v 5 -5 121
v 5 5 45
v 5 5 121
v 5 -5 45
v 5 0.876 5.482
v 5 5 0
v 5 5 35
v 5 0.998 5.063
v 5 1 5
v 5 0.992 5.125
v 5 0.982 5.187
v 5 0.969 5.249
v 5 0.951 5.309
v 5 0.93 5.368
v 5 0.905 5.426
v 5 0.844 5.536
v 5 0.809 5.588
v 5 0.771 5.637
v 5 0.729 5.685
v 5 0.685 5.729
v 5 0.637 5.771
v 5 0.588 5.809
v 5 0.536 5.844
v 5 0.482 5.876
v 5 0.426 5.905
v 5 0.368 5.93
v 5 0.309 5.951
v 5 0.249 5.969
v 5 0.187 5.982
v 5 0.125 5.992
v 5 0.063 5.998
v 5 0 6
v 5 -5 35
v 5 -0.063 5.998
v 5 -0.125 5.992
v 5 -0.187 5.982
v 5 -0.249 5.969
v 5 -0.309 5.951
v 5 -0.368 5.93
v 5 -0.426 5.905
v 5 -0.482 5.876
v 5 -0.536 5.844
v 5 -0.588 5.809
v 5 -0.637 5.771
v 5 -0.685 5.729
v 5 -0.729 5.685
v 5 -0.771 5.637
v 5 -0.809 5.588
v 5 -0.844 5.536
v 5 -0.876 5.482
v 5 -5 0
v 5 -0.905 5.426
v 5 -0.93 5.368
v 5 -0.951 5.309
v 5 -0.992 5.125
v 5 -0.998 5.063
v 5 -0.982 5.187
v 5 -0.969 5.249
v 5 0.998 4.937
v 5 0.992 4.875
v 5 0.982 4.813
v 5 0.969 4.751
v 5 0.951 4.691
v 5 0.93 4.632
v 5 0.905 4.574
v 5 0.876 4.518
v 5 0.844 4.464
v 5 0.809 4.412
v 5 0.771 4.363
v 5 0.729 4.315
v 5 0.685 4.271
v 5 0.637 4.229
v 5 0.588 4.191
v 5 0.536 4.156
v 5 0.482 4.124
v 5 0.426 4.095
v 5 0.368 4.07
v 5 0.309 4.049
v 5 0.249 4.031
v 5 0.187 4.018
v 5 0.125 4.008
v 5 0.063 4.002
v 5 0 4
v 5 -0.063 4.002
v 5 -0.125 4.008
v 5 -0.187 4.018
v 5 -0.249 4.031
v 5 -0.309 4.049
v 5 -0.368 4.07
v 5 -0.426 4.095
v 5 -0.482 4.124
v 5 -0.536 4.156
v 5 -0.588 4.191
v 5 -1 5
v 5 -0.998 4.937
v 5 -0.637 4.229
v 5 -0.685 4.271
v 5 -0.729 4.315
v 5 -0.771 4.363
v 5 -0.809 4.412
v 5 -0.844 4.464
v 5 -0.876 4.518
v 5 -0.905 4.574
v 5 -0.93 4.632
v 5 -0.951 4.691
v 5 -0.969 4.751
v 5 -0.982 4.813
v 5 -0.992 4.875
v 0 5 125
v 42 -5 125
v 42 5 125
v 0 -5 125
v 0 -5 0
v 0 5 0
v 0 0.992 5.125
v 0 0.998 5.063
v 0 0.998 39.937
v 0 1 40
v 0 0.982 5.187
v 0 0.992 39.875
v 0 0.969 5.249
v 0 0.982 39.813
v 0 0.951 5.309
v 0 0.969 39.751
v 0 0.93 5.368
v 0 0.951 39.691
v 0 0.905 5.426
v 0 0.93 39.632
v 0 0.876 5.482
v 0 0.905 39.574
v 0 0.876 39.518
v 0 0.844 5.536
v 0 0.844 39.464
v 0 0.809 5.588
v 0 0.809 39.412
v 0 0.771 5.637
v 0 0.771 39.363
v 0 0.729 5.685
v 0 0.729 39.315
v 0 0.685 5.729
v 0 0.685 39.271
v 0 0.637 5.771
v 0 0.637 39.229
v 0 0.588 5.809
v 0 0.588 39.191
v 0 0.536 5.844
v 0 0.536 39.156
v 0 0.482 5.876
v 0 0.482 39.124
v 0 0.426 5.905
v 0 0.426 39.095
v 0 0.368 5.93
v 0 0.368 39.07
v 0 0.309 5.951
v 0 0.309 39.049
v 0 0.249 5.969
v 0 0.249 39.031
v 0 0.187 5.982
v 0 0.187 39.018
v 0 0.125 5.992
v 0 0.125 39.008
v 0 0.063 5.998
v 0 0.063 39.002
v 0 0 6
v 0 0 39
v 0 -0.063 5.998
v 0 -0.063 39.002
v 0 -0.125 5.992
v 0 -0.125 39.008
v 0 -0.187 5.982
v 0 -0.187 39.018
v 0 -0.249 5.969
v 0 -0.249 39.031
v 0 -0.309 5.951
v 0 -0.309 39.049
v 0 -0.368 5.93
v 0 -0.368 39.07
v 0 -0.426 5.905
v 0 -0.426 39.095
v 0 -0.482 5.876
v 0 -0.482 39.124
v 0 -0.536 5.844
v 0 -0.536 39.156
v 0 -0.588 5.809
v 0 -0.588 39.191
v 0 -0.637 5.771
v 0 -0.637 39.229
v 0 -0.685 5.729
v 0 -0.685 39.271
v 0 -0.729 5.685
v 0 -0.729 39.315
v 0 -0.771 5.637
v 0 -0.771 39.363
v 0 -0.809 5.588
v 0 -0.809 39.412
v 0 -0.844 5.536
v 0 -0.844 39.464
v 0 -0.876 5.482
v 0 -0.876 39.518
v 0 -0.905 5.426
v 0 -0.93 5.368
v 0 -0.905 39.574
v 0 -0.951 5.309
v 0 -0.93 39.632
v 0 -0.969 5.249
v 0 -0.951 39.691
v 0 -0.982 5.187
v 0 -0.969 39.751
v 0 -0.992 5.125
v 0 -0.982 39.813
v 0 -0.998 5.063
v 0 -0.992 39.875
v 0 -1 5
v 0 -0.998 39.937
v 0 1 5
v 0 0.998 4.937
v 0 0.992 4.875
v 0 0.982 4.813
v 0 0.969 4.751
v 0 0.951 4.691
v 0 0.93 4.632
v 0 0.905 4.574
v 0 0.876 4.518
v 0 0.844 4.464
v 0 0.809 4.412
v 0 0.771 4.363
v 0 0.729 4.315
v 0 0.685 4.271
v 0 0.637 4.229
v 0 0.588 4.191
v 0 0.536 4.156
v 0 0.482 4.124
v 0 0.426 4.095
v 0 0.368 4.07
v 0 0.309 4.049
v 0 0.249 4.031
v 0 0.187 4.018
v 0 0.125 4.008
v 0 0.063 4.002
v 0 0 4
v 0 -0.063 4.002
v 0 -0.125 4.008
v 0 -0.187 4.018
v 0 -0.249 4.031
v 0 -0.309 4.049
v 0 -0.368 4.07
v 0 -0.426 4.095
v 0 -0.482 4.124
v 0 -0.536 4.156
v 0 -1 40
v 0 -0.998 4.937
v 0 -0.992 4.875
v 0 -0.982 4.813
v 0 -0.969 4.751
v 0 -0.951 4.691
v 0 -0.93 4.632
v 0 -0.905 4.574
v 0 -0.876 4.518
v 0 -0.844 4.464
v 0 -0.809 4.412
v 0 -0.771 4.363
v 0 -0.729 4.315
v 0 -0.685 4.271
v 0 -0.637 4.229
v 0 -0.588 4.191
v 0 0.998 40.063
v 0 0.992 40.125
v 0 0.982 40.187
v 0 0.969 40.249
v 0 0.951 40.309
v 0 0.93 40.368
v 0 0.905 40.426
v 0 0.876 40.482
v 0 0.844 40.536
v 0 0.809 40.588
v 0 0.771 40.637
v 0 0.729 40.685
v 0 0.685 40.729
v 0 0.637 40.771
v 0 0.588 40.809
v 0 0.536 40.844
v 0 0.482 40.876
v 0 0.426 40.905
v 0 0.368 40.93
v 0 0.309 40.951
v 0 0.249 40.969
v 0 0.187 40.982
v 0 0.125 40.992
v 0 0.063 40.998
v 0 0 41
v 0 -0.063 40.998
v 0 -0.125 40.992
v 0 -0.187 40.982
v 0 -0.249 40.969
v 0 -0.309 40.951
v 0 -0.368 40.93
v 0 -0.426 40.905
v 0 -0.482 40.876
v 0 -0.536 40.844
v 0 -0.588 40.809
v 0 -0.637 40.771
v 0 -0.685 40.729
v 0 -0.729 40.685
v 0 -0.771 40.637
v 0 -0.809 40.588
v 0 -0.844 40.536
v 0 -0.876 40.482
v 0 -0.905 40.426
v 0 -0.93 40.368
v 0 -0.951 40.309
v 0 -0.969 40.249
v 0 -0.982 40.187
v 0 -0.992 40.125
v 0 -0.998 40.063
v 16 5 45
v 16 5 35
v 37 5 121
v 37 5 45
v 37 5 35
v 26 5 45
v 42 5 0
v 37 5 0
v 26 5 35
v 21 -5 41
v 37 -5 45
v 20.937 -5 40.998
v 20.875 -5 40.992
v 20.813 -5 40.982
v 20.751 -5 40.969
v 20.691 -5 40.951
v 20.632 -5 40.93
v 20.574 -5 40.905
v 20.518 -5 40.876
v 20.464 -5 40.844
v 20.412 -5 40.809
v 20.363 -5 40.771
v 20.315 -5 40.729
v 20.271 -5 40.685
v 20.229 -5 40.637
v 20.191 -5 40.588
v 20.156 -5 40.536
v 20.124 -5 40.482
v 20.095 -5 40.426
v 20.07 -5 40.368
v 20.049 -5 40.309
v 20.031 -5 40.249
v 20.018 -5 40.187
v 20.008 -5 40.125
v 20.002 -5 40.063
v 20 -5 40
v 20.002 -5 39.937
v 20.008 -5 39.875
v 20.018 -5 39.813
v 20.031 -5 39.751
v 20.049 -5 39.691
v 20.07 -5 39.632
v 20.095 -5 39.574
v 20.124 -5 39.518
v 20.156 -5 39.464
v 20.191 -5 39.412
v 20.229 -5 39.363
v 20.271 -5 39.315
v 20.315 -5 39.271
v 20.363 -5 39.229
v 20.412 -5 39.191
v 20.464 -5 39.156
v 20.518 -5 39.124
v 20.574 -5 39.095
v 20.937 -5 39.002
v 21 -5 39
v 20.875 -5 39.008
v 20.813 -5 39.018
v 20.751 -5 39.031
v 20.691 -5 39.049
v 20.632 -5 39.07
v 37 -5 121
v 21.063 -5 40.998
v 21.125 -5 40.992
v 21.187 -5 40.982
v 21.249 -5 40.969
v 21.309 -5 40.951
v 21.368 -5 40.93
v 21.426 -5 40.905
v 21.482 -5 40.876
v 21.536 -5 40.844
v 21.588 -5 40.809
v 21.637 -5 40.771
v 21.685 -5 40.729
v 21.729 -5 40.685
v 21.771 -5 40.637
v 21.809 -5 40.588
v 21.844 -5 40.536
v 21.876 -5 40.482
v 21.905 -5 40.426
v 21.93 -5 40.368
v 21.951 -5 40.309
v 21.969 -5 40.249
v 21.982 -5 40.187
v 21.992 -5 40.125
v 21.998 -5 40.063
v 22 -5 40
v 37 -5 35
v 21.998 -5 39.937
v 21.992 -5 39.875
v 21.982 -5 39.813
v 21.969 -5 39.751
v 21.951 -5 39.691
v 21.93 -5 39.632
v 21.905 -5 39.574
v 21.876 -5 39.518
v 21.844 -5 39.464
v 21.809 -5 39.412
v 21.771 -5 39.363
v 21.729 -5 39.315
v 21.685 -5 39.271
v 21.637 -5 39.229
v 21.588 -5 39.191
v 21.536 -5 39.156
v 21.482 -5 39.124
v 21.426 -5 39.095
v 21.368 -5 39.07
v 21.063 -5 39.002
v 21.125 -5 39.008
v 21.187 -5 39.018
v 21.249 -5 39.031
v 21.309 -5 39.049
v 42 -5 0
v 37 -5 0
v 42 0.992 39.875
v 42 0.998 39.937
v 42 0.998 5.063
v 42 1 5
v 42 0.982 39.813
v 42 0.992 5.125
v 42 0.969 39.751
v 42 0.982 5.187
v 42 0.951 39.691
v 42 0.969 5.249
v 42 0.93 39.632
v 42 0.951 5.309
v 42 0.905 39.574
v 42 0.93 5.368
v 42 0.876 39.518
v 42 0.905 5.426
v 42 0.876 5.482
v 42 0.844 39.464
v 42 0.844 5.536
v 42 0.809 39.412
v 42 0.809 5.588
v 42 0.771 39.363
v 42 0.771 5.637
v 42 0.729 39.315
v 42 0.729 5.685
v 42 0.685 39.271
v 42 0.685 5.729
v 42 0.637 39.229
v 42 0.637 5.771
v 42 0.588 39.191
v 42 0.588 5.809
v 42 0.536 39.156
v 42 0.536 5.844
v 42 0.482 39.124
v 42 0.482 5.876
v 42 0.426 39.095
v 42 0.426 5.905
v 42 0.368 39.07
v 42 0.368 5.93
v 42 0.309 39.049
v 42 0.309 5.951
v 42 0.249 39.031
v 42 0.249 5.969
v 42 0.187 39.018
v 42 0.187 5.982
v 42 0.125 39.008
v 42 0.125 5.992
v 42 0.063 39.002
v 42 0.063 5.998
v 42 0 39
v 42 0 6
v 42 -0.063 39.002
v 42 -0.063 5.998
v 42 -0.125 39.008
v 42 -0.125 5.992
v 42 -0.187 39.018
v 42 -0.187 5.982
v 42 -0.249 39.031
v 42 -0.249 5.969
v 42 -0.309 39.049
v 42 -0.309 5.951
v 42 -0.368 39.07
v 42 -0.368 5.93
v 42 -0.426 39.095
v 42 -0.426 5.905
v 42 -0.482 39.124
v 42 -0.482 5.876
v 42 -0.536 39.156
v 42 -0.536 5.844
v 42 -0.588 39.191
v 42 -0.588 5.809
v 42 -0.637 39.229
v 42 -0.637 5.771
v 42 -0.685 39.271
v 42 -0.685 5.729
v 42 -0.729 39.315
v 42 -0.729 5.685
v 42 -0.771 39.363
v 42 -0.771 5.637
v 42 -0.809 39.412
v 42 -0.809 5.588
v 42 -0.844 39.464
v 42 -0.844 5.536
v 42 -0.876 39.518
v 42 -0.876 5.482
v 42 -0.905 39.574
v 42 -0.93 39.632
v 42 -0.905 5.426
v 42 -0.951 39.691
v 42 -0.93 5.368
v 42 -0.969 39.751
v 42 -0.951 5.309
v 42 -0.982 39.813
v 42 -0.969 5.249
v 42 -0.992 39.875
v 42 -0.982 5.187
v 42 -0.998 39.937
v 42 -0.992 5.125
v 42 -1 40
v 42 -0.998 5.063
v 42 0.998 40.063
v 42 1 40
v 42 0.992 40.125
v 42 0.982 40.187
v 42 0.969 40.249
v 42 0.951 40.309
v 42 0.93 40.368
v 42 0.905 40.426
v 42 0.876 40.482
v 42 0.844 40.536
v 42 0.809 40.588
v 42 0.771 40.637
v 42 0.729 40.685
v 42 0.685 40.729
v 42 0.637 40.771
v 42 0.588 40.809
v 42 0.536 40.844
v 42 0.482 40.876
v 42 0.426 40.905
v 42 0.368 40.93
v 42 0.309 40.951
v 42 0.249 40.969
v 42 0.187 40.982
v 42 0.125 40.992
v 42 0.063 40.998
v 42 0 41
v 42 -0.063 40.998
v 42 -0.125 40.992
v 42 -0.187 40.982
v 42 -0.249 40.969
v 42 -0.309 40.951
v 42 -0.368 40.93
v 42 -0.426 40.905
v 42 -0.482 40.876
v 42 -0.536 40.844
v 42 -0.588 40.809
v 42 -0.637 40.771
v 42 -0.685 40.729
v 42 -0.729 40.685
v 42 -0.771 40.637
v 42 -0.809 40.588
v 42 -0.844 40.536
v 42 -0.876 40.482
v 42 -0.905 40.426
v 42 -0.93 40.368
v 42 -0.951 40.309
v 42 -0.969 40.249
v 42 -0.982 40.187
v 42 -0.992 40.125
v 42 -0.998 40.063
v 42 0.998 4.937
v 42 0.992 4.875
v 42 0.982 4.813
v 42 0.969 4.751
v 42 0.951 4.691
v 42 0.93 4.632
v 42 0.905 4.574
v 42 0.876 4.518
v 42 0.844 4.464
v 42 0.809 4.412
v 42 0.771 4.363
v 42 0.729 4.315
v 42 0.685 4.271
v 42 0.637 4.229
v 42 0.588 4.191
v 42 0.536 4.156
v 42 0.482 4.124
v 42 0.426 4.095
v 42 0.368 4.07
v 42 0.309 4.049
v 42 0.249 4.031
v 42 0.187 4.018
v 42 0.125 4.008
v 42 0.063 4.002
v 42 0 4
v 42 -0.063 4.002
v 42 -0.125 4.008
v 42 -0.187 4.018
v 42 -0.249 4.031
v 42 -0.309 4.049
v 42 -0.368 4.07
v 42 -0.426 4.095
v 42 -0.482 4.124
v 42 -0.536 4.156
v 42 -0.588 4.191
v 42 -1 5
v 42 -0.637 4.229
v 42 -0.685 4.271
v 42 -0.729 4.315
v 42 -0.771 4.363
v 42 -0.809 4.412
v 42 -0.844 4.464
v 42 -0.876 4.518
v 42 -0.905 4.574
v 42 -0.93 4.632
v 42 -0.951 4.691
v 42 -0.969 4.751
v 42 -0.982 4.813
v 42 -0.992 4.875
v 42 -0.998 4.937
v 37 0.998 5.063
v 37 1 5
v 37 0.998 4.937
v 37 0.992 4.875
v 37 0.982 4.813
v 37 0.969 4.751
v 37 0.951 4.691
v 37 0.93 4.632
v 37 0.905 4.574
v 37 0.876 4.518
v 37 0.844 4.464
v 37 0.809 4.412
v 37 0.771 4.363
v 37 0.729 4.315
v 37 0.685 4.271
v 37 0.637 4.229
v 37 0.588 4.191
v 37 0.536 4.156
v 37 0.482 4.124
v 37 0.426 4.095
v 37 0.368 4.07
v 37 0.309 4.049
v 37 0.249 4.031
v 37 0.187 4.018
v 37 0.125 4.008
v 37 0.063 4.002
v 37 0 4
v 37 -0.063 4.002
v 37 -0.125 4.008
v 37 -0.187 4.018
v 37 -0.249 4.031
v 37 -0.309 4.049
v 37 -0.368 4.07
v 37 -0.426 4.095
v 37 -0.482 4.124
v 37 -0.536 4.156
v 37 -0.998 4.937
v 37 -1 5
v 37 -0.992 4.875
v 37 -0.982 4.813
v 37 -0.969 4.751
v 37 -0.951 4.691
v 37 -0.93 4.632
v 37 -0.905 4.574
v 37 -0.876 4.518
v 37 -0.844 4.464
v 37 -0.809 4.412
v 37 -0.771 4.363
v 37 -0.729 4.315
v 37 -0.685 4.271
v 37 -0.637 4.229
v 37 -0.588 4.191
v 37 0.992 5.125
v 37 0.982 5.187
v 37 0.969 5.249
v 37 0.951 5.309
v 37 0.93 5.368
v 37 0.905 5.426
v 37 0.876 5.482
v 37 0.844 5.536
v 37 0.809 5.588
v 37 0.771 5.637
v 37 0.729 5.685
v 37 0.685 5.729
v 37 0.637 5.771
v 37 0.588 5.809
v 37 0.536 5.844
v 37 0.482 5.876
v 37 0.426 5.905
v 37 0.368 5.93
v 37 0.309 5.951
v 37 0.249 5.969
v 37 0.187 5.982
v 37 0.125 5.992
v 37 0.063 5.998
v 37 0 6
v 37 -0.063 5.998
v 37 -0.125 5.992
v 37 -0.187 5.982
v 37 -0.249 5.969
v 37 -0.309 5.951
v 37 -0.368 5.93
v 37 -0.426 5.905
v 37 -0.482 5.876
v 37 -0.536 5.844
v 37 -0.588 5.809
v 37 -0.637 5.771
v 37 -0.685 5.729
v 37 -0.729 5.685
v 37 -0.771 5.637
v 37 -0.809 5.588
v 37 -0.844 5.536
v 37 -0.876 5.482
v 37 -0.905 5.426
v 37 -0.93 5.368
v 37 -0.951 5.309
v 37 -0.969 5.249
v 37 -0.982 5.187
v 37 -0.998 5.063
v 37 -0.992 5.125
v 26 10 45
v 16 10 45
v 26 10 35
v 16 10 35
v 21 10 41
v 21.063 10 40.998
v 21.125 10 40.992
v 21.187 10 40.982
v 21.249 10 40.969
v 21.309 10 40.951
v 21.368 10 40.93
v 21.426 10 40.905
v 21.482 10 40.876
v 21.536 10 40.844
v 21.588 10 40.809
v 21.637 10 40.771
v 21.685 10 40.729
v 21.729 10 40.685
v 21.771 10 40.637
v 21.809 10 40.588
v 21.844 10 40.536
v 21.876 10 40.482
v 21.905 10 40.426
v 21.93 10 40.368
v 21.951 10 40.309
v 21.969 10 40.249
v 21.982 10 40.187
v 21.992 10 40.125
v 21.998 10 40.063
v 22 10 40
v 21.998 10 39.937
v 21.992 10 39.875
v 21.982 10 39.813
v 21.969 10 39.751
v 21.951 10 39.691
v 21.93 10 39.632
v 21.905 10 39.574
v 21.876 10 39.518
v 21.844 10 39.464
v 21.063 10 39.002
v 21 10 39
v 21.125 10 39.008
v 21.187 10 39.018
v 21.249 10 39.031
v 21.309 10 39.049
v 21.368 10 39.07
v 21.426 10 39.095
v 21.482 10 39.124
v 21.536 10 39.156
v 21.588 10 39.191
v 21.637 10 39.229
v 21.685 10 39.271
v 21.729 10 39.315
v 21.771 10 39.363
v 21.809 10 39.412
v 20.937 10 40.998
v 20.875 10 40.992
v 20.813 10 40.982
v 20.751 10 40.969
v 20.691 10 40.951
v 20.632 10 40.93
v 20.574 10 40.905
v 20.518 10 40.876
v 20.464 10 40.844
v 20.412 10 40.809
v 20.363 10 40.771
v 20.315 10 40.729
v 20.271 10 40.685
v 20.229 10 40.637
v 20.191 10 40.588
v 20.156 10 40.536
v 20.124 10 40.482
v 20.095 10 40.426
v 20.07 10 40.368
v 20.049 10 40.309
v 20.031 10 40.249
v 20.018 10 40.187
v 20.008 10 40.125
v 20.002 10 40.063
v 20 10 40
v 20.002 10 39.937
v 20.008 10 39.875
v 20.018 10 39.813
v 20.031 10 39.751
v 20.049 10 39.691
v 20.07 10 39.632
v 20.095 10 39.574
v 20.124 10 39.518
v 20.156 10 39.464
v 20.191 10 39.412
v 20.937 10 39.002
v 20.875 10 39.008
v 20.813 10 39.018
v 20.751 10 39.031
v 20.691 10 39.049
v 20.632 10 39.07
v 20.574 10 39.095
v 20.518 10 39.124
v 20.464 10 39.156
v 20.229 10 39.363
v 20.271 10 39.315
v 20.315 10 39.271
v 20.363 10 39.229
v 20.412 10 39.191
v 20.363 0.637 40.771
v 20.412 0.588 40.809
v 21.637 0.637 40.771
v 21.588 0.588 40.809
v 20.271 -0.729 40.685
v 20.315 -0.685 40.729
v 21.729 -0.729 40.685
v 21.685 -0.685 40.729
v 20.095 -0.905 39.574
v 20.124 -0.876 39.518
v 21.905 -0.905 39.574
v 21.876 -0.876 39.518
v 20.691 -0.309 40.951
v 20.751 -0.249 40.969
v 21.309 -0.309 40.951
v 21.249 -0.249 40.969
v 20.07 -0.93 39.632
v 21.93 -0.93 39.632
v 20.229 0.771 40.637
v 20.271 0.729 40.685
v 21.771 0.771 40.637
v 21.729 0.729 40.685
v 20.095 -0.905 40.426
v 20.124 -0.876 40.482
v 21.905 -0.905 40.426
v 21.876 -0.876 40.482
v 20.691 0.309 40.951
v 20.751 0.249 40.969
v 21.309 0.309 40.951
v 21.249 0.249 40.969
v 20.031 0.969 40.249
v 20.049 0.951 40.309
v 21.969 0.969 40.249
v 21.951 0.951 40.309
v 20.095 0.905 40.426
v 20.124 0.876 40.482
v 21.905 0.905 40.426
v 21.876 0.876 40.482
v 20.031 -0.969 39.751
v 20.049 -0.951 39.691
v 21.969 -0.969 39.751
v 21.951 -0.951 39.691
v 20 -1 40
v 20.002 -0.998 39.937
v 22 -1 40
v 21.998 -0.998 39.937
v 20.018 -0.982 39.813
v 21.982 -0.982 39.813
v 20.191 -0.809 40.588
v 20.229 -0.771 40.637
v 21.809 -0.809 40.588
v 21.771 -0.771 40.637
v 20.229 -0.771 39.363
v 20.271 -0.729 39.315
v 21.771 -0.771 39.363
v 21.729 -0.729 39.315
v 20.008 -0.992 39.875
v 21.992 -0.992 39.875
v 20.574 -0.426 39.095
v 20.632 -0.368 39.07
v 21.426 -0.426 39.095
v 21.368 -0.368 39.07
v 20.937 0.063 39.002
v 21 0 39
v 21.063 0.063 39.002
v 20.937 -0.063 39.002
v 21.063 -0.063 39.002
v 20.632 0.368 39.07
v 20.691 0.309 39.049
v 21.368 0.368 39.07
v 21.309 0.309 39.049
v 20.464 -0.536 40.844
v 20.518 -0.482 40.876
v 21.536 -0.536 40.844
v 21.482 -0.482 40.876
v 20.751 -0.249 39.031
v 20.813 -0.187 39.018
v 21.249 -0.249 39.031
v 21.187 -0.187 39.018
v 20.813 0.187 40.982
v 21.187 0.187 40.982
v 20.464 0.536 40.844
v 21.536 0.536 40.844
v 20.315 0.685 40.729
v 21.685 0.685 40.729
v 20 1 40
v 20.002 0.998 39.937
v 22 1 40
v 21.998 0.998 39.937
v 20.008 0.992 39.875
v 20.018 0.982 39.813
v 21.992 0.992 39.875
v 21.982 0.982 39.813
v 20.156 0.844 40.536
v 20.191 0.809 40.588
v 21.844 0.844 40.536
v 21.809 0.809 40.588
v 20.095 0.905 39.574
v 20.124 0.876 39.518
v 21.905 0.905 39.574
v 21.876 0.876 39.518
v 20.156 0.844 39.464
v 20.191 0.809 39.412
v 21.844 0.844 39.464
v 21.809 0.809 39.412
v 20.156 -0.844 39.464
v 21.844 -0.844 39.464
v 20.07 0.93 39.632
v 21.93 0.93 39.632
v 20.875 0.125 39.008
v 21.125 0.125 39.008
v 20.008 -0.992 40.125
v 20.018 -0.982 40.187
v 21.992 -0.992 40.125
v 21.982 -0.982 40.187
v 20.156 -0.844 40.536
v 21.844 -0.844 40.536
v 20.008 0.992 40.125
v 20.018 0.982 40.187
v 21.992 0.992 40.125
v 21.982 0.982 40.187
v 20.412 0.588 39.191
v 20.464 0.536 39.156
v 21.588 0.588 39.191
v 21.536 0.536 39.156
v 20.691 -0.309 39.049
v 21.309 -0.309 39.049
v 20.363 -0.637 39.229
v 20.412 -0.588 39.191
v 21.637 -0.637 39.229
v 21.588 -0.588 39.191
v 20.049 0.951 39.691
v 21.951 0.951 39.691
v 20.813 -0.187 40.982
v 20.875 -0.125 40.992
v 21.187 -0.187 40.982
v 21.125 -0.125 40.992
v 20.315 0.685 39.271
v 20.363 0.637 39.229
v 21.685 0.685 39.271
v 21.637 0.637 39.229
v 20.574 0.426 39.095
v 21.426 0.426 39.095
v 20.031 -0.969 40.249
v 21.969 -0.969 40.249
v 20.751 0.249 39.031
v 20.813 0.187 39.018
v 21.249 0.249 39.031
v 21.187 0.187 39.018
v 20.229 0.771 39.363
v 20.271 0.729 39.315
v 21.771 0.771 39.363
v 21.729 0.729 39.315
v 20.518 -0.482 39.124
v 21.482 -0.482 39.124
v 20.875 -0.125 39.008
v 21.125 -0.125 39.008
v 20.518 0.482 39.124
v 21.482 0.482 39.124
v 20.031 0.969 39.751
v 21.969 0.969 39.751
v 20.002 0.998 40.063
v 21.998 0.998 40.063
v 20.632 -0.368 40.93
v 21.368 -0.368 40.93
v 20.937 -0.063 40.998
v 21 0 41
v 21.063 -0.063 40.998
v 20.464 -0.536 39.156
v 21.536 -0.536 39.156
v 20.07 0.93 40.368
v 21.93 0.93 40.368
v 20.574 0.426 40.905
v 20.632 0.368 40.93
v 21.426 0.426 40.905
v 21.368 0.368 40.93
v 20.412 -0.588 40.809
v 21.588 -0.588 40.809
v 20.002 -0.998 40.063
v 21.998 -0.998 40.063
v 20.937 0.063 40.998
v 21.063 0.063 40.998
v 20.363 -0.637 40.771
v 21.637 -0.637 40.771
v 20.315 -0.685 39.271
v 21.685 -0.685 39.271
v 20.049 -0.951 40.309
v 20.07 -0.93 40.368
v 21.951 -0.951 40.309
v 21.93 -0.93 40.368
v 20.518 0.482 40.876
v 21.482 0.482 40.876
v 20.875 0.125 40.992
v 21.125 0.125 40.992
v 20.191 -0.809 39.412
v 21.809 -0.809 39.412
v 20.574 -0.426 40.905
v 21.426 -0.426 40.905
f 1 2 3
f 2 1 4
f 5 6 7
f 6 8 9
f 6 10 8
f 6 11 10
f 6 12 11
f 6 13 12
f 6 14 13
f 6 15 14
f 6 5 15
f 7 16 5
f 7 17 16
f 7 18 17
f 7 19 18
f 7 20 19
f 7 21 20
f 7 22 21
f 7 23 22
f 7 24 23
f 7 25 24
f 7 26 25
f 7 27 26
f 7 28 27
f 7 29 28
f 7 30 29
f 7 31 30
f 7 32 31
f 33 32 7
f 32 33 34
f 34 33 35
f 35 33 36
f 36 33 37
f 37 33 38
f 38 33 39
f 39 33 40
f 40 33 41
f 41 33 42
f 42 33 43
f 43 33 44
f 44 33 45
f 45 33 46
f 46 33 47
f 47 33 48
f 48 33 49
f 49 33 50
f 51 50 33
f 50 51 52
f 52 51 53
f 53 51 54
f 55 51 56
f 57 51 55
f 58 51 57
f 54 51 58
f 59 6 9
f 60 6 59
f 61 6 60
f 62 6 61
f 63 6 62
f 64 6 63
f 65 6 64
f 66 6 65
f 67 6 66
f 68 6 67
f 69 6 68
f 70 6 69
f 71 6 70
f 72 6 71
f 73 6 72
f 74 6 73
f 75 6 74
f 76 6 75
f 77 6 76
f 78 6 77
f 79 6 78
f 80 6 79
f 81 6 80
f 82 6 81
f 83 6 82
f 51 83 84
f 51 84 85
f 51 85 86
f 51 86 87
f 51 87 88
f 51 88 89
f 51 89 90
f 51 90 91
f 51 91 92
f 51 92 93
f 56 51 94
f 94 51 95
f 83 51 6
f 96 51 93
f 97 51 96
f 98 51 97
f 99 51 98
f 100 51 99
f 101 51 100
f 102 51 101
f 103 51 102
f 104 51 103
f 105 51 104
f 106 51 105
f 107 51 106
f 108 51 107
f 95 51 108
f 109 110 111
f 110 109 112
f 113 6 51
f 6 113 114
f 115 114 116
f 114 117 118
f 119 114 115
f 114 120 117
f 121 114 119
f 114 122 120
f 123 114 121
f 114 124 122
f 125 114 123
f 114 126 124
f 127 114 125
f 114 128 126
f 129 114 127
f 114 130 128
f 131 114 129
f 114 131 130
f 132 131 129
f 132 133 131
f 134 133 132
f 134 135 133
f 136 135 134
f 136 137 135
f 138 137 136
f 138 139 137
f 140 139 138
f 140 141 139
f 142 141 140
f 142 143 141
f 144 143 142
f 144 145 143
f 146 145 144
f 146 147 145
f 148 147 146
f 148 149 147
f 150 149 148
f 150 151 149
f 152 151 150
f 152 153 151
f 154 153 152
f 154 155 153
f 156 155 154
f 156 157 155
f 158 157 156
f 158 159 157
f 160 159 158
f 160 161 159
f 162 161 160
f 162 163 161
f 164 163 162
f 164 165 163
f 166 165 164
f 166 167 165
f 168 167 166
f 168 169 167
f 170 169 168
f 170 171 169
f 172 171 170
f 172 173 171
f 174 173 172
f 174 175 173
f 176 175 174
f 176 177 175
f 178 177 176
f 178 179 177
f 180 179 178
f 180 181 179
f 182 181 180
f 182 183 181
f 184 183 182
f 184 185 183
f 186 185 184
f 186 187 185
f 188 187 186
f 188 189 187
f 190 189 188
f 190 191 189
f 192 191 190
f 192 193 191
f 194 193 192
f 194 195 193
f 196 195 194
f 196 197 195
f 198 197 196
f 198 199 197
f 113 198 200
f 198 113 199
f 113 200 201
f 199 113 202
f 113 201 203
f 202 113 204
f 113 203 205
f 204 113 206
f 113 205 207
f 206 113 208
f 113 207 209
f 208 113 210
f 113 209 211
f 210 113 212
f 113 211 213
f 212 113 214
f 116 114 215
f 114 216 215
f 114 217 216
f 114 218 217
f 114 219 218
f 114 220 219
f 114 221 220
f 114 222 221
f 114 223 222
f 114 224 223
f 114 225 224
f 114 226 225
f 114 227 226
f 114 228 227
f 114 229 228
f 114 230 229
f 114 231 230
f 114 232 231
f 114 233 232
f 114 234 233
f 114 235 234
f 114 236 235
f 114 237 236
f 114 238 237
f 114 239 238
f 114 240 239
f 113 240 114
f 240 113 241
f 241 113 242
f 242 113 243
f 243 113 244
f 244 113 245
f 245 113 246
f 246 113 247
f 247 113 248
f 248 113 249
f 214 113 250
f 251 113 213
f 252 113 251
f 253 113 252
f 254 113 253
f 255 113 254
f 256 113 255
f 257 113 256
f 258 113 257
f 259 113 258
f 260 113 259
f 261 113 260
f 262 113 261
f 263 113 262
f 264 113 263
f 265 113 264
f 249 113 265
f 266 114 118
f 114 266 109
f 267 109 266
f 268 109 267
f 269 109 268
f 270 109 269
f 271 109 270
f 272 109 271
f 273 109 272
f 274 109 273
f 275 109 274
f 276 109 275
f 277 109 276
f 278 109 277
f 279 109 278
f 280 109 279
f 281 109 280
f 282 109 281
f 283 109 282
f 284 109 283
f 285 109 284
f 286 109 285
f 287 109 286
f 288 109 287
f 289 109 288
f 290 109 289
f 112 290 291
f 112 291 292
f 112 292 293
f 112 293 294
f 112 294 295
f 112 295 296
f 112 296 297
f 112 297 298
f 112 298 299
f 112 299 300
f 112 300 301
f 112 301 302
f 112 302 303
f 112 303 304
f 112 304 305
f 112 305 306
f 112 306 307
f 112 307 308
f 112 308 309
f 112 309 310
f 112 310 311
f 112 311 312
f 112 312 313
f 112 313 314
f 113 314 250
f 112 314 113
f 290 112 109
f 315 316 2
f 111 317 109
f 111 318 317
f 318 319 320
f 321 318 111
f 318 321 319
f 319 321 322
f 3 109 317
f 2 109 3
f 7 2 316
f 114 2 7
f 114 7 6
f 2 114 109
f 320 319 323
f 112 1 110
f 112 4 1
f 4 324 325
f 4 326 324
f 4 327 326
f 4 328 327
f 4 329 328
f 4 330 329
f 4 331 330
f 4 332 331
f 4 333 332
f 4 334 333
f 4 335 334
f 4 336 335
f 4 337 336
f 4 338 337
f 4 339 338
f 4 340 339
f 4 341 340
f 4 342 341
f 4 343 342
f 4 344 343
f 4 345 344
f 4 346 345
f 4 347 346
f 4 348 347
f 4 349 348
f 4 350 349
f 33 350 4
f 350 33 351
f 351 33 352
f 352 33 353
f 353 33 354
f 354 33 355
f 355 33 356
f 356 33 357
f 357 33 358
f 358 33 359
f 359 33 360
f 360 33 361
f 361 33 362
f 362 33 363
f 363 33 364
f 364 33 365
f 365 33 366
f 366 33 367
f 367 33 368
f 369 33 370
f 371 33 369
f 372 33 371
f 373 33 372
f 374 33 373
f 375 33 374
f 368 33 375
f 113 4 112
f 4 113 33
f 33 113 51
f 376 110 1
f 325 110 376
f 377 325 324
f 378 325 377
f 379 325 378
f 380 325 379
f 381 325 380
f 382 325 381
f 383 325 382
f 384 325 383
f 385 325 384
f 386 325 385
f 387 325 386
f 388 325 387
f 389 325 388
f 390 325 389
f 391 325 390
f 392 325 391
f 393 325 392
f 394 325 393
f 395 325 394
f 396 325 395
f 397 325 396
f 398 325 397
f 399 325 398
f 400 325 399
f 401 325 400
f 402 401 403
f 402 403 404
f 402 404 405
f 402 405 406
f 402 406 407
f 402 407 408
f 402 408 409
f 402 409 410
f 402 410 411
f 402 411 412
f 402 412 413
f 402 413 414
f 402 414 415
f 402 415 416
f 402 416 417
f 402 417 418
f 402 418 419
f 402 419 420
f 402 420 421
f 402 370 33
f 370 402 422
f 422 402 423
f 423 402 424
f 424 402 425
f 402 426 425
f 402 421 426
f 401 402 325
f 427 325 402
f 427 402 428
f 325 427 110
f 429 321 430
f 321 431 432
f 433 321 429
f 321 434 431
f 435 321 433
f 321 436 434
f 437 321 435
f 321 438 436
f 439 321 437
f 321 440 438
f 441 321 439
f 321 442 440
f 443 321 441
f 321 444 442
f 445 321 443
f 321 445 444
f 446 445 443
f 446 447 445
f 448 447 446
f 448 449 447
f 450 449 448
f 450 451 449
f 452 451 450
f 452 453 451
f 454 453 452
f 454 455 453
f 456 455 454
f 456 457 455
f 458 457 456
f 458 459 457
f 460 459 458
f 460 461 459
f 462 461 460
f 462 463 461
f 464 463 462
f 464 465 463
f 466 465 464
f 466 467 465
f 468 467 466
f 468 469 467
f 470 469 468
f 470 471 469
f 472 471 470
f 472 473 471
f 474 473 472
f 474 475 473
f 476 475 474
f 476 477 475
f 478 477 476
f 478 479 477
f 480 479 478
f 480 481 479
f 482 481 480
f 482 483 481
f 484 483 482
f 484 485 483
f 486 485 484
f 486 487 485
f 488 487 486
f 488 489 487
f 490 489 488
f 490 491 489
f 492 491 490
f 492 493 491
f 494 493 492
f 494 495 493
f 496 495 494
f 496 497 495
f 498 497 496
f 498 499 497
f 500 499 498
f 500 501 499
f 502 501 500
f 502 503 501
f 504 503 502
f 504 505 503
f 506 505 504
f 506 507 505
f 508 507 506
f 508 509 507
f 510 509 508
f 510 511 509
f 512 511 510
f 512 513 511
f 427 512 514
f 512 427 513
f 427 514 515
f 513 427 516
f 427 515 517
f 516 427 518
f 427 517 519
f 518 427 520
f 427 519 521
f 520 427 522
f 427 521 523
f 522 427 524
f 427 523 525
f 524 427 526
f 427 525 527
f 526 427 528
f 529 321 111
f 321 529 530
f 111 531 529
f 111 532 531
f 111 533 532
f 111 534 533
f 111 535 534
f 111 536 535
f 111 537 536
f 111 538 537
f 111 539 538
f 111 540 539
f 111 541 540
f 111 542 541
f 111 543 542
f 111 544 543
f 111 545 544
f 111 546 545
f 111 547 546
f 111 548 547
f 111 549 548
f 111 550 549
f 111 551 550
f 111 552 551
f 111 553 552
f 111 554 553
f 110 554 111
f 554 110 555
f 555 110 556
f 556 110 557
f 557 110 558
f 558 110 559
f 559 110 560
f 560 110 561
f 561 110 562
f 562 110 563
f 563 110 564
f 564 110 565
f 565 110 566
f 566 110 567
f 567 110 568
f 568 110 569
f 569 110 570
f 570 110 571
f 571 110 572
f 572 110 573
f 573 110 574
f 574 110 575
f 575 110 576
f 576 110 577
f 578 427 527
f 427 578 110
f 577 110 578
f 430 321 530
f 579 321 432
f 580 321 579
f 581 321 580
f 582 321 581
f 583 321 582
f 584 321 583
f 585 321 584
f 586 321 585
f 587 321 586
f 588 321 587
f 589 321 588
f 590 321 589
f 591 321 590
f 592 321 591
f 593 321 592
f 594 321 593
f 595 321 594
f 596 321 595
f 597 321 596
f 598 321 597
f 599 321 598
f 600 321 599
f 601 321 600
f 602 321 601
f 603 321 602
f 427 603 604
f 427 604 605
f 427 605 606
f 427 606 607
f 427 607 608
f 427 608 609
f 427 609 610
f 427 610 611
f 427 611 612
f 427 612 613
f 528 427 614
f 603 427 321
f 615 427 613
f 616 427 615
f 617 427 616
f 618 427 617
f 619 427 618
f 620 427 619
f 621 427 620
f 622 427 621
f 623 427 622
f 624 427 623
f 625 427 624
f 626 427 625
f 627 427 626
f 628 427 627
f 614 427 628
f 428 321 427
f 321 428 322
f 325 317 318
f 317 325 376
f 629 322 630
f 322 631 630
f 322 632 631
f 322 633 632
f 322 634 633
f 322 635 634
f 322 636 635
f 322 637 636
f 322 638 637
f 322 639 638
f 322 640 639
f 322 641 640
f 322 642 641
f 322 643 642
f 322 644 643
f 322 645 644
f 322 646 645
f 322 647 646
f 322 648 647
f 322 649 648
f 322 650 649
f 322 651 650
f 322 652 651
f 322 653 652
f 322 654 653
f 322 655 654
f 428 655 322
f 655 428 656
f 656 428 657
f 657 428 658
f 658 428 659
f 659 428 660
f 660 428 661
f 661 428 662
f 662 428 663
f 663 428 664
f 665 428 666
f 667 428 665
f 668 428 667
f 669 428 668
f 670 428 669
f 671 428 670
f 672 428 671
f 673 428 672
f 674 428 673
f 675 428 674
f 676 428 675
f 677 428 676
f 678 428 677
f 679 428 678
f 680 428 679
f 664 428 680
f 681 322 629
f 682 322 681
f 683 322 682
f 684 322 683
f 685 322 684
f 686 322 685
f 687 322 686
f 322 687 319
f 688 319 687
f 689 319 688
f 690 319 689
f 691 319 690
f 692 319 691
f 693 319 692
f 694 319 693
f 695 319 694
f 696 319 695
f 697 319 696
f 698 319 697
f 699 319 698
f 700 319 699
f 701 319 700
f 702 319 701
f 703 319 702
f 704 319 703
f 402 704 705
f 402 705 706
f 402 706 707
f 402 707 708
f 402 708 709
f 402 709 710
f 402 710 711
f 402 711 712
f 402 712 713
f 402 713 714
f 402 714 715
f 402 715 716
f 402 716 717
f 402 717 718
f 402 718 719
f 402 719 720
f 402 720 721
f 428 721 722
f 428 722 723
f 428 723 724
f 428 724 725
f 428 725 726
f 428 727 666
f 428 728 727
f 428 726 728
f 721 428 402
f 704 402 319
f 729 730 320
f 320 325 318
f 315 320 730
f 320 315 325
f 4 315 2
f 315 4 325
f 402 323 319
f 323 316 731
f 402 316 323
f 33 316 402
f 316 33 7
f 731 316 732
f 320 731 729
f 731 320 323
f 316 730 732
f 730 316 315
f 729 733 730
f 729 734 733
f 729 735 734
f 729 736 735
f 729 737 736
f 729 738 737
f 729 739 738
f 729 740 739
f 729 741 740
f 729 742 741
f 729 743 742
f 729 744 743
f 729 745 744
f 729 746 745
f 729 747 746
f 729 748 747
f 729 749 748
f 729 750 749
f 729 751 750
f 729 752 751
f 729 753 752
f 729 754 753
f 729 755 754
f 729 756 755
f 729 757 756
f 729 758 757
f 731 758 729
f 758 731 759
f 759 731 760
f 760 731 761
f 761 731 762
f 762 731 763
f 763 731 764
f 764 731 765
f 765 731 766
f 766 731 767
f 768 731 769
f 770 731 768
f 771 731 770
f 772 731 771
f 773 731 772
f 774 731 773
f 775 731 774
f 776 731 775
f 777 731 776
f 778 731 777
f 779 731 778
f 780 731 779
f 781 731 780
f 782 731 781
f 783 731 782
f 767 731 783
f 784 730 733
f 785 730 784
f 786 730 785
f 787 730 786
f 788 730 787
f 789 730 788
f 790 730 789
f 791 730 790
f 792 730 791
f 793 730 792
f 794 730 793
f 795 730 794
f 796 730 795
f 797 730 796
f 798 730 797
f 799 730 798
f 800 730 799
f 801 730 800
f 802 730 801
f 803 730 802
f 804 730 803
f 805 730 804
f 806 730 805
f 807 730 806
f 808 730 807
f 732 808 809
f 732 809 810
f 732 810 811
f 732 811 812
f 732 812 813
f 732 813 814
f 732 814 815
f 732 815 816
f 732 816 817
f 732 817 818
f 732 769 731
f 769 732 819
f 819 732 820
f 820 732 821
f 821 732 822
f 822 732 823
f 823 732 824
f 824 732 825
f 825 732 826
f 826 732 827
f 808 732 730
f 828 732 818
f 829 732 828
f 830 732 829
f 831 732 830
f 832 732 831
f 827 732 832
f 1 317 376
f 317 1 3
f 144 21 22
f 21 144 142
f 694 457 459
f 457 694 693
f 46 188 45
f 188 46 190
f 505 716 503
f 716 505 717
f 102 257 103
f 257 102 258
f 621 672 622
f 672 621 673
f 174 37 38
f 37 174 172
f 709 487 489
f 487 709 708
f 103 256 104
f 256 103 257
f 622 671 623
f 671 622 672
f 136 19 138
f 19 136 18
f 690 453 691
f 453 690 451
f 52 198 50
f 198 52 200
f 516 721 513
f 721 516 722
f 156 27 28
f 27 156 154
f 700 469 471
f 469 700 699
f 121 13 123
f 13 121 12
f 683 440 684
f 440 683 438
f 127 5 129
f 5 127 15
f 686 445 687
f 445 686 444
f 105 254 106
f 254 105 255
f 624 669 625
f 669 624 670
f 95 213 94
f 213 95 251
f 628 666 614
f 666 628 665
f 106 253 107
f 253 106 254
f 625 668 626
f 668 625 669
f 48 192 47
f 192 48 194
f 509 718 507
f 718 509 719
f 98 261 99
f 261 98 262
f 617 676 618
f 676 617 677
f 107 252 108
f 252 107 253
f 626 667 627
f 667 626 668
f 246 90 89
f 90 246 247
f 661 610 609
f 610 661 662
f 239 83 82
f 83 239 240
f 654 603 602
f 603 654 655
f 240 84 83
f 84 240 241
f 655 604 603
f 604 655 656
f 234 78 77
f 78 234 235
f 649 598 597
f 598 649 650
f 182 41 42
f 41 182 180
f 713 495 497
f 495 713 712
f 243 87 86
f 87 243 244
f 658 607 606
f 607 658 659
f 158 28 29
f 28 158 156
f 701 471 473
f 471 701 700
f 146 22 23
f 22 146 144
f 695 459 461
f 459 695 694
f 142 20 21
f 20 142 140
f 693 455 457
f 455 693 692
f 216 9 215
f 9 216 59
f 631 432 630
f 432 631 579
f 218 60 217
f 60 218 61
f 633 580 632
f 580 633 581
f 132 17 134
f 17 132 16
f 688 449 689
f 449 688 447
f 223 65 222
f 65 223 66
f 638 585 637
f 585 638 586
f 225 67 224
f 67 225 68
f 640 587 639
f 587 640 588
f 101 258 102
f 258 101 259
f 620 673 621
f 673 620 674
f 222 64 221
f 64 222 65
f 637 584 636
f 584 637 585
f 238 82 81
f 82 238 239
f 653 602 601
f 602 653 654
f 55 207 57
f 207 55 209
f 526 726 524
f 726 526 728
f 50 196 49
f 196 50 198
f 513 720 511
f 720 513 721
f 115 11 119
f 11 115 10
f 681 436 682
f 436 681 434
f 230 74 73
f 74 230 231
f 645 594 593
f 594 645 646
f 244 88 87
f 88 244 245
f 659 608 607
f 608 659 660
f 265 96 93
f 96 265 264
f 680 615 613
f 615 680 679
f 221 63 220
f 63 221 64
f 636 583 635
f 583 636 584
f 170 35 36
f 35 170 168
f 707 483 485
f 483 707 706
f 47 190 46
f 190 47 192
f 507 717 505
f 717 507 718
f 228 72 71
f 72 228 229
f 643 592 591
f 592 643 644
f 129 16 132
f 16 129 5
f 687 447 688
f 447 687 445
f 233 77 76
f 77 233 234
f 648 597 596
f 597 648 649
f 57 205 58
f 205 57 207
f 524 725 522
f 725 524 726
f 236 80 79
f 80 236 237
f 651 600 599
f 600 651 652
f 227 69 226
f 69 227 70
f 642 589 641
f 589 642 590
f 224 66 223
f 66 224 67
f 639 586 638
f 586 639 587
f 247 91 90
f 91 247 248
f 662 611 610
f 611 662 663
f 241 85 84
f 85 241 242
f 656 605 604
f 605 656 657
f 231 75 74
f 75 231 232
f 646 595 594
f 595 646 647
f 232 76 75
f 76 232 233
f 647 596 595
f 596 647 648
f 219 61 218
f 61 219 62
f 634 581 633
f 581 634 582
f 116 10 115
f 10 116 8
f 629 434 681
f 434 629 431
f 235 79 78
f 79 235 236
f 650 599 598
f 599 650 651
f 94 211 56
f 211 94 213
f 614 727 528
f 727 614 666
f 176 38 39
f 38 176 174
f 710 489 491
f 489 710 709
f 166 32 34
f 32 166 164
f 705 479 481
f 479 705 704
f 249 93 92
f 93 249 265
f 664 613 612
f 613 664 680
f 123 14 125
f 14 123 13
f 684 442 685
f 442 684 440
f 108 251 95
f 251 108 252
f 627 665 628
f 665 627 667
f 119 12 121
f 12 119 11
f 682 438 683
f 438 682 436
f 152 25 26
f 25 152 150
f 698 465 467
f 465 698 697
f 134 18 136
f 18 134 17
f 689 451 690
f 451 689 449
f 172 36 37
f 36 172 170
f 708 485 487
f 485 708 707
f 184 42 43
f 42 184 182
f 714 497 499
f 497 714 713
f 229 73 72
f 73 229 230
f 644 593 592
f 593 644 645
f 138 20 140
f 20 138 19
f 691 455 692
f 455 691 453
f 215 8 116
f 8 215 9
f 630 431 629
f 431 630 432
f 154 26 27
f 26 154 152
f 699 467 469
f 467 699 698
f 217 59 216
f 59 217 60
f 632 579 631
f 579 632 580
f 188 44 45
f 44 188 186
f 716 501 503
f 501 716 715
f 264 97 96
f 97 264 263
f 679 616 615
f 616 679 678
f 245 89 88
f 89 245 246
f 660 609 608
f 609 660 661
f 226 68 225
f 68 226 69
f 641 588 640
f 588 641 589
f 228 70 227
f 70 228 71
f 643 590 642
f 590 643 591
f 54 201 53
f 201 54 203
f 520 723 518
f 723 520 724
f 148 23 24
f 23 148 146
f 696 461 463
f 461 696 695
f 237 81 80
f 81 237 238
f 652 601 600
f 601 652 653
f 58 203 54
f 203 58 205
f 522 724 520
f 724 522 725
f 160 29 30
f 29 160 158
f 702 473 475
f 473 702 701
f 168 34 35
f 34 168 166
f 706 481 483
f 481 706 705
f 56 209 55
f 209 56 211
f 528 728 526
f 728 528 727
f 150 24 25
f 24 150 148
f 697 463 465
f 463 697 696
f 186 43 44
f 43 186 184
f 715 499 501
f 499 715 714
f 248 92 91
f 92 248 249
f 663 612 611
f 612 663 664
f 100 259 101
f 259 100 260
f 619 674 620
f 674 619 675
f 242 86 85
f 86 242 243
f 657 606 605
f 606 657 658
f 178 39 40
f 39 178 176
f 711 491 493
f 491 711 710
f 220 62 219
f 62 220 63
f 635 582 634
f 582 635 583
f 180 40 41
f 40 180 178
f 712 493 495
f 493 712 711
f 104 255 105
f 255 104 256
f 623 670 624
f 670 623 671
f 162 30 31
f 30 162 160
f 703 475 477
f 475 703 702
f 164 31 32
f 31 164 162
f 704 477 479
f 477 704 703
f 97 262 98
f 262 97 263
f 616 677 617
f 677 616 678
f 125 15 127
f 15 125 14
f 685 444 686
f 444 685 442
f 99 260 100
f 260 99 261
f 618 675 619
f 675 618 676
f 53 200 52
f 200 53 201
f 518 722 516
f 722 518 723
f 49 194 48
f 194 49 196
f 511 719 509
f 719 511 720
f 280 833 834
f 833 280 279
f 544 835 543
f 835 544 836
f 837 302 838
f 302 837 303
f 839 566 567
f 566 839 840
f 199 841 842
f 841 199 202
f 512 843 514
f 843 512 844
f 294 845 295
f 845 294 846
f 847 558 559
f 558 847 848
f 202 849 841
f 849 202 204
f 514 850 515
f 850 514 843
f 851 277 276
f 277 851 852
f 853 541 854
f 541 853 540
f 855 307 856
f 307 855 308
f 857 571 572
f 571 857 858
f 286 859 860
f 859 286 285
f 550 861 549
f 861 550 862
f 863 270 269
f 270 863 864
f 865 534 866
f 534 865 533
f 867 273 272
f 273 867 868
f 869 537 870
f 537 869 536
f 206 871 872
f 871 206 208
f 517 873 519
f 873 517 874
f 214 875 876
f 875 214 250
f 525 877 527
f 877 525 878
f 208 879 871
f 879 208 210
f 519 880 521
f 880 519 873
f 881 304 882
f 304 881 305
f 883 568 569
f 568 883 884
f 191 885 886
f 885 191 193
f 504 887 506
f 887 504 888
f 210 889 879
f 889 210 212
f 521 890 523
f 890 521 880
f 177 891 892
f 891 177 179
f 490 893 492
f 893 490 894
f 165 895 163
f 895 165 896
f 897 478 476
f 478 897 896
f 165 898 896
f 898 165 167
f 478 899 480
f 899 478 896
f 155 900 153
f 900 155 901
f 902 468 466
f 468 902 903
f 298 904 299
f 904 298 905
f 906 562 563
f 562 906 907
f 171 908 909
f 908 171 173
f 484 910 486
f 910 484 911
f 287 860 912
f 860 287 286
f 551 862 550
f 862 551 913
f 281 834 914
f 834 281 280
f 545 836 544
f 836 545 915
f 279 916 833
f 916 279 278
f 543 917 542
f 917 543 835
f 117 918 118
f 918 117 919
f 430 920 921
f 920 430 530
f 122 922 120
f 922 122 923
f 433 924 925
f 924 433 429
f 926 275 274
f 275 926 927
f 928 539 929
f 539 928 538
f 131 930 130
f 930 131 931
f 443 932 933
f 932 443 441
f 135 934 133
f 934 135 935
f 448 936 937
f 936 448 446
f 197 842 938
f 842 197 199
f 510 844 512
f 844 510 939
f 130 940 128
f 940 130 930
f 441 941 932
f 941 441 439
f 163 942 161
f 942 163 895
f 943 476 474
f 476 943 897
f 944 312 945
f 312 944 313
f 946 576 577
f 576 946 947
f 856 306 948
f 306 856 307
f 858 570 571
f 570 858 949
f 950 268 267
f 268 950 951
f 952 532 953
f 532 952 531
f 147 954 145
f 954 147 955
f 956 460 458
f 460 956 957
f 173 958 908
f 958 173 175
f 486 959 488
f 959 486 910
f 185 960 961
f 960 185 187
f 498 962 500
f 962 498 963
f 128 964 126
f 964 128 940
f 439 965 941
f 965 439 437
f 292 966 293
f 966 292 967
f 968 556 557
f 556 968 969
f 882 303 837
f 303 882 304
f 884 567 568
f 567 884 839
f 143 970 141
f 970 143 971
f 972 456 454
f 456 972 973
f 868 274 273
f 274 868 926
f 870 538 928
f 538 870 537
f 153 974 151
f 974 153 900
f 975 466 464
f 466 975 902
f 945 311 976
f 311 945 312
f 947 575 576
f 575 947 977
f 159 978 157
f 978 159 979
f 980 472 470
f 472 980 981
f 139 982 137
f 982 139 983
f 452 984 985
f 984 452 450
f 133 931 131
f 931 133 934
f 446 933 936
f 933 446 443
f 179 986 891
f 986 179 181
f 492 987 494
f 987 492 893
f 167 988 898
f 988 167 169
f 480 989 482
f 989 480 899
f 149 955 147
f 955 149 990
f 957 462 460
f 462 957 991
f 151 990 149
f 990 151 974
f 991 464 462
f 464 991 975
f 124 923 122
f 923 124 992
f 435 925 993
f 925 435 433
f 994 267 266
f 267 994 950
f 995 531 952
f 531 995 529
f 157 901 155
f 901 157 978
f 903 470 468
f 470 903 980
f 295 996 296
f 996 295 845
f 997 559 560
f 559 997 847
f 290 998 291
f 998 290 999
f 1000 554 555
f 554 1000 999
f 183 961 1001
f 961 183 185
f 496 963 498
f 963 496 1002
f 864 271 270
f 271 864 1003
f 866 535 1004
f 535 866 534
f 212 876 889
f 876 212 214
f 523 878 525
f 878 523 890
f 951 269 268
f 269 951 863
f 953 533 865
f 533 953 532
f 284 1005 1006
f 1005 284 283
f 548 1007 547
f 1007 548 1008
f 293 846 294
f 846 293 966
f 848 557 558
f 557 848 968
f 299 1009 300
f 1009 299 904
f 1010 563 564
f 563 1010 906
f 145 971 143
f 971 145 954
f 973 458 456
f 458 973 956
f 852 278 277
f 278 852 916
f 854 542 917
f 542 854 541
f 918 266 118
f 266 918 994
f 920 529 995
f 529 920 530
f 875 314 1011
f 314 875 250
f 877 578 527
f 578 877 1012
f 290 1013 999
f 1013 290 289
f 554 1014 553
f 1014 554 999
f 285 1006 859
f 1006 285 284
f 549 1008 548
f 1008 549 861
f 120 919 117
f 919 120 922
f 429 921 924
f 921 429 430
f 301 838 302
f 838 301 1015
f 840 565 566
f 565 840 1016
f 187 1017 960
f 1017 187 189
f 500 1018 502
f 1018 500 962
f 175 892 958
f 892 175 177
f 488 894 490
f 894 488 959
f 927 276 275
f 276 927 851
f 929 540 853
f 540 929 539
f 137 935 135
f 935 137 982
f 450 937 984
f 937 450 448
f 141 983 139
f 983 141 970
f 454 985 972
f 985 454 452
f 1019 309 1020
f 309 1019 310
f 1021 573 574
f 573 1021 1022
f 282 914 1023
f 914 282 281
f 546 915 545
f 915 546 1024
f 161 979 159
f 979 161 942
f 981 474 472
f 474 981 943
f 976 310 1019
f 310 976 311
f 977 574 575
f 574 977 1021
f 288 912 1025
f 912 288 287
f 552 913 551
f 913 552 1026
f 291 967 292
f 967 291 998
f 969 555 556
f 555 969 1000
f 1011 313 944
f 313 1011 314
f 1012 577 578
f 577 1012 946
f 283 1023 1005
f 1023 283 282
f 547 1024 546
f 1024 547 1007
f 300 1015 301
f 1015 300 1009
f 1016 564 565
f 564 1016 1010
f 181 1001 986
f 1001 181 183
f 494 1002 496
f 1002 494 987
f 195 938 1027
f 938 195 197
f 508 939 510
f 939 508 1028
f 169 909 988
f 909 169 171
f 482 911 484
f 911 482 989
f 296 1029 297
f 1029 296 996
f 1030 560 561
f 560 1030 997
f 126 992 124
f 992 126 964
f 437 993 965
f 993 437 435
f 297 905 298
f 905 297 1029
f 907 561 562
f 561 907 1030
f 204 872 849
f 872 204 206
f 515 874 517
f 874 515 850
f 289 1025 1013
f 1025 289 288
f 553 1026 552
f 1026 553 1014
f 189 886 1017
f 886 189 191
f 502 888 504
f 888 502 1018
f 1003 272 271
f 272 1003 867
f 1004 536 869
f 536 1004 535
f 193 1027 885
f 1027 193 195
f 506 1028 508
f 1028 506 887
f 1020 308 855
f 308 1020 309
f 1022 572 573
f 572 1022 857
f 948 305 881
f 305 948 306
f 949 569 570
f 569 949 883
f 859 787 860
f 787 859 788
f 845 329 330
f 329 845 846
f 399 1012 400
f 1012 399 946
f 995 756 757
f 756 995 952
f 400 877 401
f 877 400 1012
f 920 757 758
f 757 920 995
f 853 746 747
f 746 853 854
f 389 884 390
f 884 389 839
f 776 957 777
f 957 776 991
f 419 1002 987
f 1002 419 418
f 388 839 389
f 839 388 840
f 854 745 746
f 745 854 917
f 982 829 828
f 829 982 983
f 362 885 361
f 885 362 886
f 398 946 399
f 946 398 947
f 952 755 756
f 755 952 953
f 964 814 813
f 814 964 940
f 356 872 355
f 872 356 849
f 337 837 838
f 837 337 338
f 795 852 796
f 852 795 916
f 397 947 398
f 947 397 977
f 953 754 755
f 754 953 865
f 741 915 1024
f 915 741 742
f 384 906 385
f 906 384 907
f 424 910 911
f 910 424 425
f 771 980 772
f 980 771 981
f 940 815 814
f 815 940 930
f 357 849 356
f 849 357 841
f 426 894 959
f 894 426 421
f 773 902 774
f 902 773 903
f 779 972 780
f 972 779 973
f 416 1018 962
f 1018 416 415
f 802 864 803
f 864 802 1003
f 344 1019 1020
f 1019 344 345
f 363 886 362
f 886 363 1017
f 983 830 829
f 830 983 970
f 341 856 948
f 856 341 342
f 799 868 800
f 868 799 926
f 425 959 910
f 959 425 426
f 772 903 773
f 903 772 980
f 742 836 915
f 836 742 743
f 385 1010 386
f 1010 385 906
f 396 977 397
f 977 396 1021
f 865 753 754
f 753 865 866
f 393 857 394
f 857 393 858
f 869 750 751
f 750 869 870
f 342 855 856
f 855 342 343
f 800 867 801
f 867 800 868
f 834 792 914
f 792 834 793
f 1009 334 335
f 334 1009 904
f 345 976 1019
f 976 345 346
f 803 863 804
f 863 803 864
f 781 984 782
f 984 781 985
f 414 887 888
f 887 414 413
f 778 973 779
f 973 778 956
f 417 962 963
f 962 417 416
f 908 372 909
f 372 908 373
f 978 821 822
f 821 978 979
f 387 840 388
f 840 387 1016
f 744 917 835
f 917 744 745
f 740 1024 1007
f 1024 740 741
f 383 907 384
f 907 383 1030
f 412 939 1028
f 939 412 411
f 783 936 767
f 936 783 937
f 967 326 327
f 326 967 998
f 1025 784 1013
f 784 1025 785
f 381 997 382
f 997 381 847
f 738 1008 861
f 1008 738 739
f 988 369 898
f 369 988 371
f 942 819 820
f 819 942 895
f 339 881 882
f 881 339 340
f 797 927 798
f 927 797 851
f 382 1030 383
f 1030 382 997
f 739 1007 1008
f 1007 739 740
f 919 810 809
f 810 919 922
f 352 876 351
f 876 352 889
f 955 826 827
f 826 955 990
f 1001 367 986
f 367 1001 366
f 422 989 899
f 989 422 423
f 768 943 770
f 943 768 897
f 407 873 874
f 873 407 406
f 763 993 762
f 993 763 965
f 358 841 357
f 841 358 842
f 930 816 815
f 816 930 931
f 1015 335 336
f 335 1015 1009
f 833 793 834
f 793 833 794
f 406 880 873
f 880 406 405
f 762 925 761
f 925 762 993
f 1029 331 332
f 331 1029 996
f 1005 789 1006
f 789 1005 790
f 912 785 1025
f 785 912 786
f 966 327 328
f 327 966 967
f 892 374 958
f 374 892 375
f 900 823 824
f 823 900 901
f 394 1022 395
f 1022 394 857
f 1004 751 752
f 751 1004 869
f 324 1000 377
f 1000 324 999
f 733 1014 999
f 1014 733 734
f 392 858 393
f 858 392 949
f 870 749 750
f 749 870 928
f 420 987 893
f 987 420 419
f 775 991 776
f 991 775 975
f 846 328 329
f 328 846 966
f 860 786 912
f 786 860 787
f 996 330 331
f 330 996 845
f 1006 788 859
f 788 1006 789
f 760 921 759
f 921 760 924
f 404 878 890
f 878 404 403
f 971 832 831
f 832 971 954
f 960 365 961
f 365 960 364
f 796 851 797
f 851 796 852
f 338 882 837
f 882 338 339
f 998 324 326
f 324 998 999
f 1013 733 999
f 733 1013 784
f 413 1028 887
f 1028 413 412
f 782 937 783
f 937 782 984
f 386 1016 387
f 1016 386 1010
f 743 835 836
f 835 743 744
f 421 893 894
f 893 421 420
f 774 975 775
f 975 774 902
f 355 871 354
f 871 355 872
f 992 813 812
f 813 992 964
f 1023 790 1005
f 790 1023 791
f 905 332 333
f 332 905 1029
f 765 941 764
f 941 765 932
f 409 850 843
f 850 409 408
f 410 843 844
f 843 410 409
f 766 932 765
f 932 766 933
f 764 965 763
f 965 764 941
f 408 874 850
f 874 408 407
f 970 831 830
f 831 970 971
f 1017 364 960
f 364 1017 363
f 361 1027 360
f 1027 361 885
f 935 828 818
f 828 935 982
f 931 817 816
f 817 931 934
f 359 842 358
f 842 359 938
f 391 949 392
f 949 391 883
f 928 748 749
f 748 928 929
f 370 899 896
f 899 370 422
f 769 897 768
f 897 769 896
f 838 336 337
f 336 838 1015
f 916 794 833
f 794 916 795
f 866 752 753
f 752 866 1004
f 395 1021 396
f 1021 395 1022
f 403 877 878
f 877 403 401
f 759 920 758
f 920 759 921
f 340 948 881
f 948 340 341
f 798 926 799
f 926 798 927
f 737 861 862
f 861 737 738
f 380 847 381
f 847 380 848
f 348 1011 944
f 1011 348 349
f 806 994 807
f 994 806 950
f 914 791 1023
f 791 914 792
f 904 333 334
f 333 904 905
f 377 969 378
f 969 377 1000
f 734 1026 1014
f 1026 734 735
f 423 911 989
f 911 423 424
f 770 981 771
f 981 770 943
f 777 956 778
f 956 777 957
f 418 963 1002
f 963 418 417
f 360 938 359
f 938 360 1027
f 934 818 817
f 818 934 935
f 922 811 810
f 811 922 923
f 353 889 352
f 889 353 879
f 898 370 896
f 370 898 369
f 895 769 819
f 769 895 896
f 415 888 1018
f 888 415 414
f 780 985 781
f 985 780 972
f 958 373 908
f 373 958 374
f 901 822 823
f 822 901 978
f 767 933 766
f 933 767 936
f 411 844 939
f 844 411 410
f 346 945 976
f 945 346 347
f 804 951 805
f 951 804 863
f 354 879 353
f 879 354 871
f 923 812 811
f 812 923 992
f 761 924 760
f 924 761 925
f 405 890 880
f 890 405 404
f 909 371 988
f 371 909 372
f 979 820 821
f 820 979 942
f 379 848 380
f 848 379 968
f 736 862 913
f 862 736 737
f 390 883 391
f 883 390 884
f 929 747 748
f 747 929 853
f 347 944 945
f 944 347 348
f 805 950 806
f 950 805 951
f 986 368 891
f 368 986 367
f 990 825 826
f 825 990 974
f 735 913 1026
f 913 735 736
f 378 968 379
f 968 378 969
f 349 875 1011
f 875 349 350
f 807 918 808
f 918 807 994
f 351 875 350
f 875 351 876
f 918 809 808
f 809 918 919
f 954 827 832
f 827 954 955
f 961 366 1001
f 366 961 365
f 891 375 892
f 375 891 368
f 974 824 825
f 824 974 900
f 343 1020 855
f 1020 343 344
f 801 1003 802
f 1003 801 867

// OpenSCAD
difference(){
	union(){
        translate([0,-5,0]){
           cube([5,10,125], center=false);
       }
       translate([5+32,-5,0]){
           cube([5,10,125], center=false);
       }


       translate([5,-5,35]){
           cube([32,10,10], center=false);
       }
       translate([32/2,-5,35]){
           cube([10,15,10], center=false);
       }
       translate([5,-5,121]){
           cube([32,10,4], center=false);
       }


	}
	union() {       
       translate([-30,0,5]){
            rotate(a = [0,90,0]) {
                cylinder(h=600, r=1, $fn=100, center=false);
            }
       }			   
       translate([-30,0,40]){
            rotate(a = [0,90,0]) {
                cylinder(h=600, r=1, $fn=100, center=false);
            }
       }			   
			   
 		  			   

       translate([5+32/2,20,40]){
            rotate(a = [90,0,0]) {
                cylinder(h=600, r=1, $fn=100, center=false);
            }
       }

 			
			   
   


        
	}
}
